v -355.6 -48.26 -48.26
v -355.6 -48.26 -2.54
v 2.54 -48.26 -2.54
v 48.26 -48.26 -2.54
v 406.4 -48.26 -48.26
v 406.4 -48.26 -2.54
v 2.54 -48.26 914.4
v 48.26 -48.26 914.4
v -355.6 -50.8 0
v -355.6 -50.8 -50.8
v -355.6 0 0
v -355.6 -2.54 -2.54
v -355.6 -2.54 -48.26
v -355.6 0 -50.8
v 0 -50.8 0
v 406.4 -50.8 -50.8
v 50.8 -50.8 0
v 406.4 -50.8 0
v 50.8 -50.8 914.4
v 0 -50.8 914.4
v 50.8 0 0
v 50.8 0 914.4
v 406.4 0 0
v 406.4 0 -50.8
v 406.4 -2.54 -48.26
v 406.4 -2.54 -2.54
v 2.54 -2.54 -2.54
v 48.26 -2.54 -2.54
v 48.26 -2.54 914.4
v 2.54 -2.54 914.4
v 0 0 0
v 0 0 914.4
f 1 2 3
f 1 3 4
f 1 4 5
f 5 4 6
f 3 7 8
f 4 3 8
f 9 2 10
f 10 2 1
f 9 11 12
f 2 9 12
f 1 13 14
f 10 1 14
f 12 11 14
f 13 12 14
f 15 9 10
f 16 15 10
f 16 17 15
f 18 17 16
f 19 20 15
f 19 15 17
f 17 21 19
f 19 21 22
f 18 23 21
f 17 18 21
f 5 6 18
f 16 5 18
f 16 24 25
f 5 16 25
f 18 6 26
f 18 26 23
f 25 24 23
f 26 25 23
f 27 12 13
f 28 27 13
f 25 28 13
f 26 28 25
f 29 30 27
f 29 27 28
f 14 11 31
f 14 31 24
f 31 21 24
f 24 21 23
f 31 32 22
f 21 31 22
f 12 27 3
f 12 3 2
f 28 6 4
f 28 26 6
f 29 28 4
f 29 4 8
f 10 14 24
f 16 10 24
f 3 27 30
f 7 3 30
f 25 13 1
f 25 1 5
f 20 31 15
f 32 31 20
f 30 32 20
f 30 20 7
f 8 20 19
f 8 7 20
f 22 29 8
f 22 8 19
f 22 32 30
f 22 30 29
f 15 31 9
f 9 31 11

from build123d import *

# Parameters (mm, degrees)
F0_W     = 50.8
F0_H     = 914.4
F1_DEPTH = 50.8
F2_T     = -2.54


with BuildPart() as f1:
    # F0 (on Front) → F1 (new body)
    with BuildSketch(Plane.XZ):
        with Locations((25.4, 457.2)):
            Rectangle(F0_W, F0_H)
        Polygon((50.8, 0), (0, 0), (-355.6, 0), (-355.6, -50.8), (406.4, -50.8), (406.4, 0), align=None)
    extrude(amount=F1_DEPTH)

    # F2
    f2_openings = [f1.faces().sort_by_distance(p)[0] for p in [
        (25.4, -25.4, 914.4),
        (406.4, -25.4, -25.4),
        (-355.6, -25.4, -25.4),
    ]]
    offset(amount=F2_T, openings=f2_openings, kind=Kind.INTERSECTION)


solid = f1.part
